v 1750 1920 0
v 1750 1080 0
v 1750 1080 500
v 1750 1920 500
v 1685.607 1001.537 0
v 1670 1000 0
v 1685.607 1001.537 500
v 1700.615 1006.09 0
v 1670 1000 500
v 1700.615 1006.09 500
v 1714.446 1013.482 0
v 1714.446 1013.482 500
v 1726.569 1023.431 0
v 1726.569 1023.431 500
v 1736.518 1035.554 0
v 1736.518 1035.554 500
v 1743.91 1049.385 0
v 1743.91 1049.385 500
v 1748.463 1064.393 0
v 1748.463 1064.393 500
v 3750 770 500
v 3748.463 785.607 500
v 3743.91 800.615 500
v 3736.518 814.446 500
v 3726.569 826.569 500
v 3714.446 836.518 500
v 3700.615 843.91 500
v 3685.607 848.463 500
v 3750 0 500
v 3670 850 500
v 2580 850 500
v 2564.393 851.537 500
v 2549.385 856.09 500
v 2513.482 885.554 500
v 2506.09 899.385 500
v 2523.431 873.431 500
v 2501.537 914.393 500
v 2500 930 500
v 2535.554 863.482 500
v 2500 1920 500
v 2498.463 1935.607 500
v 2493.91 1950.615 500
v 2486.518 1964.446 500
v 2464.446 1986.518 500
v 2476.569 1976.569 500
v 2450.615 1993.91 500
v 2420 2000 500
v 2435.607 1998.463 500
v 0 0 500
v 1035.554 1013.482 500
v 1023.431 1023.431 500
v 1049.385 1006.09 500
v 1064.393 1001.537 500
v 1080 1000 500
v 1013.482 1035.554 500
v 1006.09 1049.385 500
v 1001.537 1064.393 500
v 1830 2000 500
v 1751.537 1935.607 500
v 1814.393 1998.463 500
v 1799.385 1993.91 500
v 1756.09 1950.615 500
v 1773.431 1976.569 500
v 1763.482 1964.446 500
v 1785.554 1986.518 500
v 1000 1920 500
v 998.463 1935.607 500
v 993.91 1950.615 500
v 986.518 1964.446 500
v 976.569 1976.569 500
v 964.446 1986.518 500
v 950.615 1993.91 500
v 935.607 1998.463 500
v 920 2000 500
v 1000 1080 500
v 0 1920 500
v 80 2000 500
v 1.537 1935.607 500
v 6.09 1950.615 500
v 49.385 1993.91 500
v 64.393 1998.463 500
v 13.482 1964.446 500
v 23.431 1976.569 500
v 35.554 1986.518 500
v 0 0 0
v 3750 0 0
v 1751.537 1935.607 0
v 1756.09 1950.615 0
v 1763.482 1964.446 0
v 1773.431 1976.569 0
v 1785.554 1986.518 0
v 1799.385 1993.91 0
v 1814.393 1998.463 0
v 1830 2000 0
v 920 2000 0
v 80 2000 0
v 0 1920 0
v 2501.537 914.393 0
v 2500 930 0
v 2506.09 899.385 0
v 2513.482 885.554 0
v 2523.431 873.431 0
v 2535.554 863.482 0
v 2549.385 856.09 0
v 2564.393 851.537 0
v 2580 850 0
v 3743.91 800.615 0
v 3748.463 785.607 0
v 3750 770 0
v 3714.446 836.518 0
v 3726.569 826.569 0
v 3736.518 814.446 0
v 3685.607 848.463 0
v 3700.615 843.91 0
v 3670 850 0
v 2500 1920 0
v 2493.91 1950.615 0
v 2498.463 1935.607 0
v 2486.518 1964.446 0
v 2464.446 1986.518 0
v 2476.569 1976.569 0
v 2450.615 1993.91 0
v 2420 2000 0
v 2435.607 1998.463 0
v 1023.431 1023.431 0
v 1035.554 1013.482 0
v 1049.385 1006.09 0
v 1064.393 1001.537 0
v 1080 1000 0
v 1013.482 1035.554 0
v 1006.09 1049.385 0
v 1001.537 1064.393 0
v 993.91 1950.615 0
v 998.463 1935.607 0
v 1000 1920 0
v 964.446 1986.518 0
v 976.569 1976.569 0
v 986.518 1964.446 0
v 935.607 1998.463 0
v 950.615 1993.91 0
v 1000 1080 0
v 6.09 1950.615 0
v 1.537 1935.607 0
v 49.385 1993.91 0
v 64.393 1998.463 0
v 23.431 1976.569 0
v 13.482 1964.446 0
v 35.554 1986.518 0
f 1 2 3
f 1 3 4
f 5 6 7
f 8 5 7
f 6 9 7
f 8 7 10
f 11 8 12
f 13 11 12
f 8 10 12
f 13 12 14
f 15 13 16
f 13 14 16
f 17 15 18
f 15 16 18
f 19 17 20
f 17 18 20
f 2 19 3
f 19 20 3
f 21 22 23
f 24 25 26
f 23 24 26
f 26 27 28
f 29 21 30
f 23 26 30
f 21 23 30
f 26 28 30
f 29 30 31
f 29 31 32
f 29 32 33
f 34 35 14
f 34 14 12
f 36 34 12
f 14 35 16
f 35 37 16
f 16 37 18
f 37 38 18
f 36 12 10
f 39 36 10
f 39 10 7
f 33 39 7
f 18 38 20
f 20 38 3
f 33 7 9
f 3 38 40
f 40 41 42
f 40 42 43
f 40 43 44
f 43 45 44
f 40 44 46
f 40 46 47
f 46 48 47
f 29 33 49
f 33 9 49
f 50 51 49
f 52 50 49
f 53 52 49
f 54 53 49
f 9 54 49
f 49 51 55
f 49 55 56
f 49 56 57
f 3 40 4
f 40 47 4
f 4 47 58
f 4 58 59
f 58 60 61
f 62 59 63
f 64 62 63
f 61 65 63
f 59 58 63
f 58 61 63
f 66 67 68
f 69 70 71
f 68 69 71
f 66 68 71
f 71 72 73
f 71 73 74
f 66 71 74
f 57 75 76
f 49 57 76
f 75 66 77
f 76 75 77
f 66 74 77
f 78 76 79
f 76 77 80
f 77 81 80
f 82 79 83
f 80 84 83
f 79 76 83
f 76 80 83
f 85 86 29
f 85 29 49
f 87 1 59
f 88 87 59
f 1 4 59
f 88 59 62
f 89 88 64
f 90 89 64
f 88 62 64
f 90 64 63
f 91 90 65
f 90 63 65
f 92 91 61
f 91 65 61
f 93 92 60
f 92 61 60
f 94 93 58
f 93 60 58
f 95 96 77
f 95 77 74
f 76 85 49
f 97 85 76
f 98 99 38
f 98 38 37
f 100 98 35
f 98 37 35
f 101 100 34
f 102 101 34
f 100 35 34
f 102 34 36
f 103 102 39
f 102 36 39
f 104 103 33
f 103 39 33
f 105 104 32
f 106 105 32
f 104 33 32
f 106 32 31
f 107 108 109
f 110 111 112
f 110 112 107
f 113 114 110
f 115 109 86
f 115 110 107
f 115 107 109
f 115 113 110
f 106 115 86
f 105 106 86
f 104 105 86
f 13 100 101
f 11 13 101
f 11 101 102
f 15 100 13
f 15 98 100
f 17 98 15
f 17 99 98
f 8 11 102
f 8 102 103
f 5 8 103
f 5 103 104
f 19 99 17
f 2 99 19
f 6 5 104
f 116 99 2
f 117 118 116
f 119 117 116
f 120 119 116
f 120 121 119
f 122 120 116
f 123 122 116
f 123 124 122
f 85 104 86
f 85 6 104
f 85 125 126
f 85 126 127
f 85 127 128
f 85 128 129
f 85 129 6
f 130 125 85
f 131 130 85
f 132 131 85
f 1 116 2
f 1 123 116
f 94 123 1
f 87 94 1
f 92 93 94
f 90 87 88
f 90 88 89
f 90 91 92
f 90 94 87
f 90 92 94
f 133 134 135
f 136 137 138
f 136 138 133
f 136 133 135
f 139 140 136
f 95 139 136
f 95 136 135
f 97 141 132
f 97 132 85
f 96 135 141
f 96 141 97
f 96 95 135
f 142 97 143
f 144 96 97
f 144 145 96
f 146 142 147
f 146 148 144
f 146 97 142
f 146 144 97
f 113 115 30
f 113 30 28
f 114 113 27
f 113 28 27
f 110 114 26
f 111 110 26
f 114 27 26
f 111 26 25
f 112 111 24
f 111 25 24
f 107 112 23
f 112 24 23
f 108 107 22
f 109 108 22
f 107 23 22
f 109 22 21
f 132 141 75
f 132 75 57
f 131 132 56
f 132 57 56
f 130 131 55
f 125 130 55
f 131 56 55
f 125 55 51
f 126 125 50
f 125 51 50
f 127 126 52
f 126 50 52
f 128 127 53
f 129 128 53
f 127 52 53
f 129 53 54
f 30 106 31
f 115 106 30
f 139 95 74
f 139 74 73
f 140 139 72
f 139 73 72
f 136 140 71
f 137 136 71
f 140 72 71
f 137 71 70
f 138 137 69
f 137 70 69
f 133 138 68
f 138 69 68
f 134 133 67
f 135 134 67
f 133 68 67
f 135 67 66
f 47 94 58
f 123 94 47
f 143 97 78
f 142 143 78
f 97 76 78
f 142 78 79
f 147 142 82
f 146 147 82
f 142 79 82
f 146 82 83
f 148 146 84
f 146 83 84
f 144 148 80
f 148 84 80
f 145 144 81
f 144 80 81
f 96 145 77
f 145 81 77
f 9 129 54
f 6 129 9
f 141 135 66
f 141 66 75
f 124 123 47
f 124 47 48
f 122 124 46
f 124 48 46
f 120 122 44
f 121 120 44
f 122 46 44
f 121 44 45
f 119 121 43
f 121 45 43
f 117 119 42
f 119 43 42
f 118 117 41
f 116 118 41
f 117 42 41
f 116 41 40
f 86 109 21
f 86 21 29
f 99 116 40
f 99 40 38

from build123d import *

# Parameters (mm, degrees)
BOSS_EXTRUDE1_DEPTH = 500
FILLET1_R           = 80


with BuildPart() as part:
    # Sketch1 → Boss-Extrude1 (new body)
    with BuildSketch(Plane.XY):
        Polygon((0, 0), (0, 2000), (1000, 2000), (1000, 1000), (1750, 1000), (1750, 2000), (2500, 2000), (2500, 850), (3750, 850), (3750, 0), align=None)
    extrude(amount=BOSS_EXTRUDE1_DEPTH)

    # Fillet1
    fillet1_edges = [part.edges().sort_by_distance(p)[0] for p in [
        (0, 2000, 250),
        (1000, 2000, 250),
        (1000, 1000, 250),
        (1750, 1000, 250),
        (1750, 2000, 250),
        (2500, 2000, 250),
        (2500, 850, 250),
        (3750, 850, 250),
    ]]
    fillet(fillet1_edges, radius=FILLET1_R)


solid = part.part
